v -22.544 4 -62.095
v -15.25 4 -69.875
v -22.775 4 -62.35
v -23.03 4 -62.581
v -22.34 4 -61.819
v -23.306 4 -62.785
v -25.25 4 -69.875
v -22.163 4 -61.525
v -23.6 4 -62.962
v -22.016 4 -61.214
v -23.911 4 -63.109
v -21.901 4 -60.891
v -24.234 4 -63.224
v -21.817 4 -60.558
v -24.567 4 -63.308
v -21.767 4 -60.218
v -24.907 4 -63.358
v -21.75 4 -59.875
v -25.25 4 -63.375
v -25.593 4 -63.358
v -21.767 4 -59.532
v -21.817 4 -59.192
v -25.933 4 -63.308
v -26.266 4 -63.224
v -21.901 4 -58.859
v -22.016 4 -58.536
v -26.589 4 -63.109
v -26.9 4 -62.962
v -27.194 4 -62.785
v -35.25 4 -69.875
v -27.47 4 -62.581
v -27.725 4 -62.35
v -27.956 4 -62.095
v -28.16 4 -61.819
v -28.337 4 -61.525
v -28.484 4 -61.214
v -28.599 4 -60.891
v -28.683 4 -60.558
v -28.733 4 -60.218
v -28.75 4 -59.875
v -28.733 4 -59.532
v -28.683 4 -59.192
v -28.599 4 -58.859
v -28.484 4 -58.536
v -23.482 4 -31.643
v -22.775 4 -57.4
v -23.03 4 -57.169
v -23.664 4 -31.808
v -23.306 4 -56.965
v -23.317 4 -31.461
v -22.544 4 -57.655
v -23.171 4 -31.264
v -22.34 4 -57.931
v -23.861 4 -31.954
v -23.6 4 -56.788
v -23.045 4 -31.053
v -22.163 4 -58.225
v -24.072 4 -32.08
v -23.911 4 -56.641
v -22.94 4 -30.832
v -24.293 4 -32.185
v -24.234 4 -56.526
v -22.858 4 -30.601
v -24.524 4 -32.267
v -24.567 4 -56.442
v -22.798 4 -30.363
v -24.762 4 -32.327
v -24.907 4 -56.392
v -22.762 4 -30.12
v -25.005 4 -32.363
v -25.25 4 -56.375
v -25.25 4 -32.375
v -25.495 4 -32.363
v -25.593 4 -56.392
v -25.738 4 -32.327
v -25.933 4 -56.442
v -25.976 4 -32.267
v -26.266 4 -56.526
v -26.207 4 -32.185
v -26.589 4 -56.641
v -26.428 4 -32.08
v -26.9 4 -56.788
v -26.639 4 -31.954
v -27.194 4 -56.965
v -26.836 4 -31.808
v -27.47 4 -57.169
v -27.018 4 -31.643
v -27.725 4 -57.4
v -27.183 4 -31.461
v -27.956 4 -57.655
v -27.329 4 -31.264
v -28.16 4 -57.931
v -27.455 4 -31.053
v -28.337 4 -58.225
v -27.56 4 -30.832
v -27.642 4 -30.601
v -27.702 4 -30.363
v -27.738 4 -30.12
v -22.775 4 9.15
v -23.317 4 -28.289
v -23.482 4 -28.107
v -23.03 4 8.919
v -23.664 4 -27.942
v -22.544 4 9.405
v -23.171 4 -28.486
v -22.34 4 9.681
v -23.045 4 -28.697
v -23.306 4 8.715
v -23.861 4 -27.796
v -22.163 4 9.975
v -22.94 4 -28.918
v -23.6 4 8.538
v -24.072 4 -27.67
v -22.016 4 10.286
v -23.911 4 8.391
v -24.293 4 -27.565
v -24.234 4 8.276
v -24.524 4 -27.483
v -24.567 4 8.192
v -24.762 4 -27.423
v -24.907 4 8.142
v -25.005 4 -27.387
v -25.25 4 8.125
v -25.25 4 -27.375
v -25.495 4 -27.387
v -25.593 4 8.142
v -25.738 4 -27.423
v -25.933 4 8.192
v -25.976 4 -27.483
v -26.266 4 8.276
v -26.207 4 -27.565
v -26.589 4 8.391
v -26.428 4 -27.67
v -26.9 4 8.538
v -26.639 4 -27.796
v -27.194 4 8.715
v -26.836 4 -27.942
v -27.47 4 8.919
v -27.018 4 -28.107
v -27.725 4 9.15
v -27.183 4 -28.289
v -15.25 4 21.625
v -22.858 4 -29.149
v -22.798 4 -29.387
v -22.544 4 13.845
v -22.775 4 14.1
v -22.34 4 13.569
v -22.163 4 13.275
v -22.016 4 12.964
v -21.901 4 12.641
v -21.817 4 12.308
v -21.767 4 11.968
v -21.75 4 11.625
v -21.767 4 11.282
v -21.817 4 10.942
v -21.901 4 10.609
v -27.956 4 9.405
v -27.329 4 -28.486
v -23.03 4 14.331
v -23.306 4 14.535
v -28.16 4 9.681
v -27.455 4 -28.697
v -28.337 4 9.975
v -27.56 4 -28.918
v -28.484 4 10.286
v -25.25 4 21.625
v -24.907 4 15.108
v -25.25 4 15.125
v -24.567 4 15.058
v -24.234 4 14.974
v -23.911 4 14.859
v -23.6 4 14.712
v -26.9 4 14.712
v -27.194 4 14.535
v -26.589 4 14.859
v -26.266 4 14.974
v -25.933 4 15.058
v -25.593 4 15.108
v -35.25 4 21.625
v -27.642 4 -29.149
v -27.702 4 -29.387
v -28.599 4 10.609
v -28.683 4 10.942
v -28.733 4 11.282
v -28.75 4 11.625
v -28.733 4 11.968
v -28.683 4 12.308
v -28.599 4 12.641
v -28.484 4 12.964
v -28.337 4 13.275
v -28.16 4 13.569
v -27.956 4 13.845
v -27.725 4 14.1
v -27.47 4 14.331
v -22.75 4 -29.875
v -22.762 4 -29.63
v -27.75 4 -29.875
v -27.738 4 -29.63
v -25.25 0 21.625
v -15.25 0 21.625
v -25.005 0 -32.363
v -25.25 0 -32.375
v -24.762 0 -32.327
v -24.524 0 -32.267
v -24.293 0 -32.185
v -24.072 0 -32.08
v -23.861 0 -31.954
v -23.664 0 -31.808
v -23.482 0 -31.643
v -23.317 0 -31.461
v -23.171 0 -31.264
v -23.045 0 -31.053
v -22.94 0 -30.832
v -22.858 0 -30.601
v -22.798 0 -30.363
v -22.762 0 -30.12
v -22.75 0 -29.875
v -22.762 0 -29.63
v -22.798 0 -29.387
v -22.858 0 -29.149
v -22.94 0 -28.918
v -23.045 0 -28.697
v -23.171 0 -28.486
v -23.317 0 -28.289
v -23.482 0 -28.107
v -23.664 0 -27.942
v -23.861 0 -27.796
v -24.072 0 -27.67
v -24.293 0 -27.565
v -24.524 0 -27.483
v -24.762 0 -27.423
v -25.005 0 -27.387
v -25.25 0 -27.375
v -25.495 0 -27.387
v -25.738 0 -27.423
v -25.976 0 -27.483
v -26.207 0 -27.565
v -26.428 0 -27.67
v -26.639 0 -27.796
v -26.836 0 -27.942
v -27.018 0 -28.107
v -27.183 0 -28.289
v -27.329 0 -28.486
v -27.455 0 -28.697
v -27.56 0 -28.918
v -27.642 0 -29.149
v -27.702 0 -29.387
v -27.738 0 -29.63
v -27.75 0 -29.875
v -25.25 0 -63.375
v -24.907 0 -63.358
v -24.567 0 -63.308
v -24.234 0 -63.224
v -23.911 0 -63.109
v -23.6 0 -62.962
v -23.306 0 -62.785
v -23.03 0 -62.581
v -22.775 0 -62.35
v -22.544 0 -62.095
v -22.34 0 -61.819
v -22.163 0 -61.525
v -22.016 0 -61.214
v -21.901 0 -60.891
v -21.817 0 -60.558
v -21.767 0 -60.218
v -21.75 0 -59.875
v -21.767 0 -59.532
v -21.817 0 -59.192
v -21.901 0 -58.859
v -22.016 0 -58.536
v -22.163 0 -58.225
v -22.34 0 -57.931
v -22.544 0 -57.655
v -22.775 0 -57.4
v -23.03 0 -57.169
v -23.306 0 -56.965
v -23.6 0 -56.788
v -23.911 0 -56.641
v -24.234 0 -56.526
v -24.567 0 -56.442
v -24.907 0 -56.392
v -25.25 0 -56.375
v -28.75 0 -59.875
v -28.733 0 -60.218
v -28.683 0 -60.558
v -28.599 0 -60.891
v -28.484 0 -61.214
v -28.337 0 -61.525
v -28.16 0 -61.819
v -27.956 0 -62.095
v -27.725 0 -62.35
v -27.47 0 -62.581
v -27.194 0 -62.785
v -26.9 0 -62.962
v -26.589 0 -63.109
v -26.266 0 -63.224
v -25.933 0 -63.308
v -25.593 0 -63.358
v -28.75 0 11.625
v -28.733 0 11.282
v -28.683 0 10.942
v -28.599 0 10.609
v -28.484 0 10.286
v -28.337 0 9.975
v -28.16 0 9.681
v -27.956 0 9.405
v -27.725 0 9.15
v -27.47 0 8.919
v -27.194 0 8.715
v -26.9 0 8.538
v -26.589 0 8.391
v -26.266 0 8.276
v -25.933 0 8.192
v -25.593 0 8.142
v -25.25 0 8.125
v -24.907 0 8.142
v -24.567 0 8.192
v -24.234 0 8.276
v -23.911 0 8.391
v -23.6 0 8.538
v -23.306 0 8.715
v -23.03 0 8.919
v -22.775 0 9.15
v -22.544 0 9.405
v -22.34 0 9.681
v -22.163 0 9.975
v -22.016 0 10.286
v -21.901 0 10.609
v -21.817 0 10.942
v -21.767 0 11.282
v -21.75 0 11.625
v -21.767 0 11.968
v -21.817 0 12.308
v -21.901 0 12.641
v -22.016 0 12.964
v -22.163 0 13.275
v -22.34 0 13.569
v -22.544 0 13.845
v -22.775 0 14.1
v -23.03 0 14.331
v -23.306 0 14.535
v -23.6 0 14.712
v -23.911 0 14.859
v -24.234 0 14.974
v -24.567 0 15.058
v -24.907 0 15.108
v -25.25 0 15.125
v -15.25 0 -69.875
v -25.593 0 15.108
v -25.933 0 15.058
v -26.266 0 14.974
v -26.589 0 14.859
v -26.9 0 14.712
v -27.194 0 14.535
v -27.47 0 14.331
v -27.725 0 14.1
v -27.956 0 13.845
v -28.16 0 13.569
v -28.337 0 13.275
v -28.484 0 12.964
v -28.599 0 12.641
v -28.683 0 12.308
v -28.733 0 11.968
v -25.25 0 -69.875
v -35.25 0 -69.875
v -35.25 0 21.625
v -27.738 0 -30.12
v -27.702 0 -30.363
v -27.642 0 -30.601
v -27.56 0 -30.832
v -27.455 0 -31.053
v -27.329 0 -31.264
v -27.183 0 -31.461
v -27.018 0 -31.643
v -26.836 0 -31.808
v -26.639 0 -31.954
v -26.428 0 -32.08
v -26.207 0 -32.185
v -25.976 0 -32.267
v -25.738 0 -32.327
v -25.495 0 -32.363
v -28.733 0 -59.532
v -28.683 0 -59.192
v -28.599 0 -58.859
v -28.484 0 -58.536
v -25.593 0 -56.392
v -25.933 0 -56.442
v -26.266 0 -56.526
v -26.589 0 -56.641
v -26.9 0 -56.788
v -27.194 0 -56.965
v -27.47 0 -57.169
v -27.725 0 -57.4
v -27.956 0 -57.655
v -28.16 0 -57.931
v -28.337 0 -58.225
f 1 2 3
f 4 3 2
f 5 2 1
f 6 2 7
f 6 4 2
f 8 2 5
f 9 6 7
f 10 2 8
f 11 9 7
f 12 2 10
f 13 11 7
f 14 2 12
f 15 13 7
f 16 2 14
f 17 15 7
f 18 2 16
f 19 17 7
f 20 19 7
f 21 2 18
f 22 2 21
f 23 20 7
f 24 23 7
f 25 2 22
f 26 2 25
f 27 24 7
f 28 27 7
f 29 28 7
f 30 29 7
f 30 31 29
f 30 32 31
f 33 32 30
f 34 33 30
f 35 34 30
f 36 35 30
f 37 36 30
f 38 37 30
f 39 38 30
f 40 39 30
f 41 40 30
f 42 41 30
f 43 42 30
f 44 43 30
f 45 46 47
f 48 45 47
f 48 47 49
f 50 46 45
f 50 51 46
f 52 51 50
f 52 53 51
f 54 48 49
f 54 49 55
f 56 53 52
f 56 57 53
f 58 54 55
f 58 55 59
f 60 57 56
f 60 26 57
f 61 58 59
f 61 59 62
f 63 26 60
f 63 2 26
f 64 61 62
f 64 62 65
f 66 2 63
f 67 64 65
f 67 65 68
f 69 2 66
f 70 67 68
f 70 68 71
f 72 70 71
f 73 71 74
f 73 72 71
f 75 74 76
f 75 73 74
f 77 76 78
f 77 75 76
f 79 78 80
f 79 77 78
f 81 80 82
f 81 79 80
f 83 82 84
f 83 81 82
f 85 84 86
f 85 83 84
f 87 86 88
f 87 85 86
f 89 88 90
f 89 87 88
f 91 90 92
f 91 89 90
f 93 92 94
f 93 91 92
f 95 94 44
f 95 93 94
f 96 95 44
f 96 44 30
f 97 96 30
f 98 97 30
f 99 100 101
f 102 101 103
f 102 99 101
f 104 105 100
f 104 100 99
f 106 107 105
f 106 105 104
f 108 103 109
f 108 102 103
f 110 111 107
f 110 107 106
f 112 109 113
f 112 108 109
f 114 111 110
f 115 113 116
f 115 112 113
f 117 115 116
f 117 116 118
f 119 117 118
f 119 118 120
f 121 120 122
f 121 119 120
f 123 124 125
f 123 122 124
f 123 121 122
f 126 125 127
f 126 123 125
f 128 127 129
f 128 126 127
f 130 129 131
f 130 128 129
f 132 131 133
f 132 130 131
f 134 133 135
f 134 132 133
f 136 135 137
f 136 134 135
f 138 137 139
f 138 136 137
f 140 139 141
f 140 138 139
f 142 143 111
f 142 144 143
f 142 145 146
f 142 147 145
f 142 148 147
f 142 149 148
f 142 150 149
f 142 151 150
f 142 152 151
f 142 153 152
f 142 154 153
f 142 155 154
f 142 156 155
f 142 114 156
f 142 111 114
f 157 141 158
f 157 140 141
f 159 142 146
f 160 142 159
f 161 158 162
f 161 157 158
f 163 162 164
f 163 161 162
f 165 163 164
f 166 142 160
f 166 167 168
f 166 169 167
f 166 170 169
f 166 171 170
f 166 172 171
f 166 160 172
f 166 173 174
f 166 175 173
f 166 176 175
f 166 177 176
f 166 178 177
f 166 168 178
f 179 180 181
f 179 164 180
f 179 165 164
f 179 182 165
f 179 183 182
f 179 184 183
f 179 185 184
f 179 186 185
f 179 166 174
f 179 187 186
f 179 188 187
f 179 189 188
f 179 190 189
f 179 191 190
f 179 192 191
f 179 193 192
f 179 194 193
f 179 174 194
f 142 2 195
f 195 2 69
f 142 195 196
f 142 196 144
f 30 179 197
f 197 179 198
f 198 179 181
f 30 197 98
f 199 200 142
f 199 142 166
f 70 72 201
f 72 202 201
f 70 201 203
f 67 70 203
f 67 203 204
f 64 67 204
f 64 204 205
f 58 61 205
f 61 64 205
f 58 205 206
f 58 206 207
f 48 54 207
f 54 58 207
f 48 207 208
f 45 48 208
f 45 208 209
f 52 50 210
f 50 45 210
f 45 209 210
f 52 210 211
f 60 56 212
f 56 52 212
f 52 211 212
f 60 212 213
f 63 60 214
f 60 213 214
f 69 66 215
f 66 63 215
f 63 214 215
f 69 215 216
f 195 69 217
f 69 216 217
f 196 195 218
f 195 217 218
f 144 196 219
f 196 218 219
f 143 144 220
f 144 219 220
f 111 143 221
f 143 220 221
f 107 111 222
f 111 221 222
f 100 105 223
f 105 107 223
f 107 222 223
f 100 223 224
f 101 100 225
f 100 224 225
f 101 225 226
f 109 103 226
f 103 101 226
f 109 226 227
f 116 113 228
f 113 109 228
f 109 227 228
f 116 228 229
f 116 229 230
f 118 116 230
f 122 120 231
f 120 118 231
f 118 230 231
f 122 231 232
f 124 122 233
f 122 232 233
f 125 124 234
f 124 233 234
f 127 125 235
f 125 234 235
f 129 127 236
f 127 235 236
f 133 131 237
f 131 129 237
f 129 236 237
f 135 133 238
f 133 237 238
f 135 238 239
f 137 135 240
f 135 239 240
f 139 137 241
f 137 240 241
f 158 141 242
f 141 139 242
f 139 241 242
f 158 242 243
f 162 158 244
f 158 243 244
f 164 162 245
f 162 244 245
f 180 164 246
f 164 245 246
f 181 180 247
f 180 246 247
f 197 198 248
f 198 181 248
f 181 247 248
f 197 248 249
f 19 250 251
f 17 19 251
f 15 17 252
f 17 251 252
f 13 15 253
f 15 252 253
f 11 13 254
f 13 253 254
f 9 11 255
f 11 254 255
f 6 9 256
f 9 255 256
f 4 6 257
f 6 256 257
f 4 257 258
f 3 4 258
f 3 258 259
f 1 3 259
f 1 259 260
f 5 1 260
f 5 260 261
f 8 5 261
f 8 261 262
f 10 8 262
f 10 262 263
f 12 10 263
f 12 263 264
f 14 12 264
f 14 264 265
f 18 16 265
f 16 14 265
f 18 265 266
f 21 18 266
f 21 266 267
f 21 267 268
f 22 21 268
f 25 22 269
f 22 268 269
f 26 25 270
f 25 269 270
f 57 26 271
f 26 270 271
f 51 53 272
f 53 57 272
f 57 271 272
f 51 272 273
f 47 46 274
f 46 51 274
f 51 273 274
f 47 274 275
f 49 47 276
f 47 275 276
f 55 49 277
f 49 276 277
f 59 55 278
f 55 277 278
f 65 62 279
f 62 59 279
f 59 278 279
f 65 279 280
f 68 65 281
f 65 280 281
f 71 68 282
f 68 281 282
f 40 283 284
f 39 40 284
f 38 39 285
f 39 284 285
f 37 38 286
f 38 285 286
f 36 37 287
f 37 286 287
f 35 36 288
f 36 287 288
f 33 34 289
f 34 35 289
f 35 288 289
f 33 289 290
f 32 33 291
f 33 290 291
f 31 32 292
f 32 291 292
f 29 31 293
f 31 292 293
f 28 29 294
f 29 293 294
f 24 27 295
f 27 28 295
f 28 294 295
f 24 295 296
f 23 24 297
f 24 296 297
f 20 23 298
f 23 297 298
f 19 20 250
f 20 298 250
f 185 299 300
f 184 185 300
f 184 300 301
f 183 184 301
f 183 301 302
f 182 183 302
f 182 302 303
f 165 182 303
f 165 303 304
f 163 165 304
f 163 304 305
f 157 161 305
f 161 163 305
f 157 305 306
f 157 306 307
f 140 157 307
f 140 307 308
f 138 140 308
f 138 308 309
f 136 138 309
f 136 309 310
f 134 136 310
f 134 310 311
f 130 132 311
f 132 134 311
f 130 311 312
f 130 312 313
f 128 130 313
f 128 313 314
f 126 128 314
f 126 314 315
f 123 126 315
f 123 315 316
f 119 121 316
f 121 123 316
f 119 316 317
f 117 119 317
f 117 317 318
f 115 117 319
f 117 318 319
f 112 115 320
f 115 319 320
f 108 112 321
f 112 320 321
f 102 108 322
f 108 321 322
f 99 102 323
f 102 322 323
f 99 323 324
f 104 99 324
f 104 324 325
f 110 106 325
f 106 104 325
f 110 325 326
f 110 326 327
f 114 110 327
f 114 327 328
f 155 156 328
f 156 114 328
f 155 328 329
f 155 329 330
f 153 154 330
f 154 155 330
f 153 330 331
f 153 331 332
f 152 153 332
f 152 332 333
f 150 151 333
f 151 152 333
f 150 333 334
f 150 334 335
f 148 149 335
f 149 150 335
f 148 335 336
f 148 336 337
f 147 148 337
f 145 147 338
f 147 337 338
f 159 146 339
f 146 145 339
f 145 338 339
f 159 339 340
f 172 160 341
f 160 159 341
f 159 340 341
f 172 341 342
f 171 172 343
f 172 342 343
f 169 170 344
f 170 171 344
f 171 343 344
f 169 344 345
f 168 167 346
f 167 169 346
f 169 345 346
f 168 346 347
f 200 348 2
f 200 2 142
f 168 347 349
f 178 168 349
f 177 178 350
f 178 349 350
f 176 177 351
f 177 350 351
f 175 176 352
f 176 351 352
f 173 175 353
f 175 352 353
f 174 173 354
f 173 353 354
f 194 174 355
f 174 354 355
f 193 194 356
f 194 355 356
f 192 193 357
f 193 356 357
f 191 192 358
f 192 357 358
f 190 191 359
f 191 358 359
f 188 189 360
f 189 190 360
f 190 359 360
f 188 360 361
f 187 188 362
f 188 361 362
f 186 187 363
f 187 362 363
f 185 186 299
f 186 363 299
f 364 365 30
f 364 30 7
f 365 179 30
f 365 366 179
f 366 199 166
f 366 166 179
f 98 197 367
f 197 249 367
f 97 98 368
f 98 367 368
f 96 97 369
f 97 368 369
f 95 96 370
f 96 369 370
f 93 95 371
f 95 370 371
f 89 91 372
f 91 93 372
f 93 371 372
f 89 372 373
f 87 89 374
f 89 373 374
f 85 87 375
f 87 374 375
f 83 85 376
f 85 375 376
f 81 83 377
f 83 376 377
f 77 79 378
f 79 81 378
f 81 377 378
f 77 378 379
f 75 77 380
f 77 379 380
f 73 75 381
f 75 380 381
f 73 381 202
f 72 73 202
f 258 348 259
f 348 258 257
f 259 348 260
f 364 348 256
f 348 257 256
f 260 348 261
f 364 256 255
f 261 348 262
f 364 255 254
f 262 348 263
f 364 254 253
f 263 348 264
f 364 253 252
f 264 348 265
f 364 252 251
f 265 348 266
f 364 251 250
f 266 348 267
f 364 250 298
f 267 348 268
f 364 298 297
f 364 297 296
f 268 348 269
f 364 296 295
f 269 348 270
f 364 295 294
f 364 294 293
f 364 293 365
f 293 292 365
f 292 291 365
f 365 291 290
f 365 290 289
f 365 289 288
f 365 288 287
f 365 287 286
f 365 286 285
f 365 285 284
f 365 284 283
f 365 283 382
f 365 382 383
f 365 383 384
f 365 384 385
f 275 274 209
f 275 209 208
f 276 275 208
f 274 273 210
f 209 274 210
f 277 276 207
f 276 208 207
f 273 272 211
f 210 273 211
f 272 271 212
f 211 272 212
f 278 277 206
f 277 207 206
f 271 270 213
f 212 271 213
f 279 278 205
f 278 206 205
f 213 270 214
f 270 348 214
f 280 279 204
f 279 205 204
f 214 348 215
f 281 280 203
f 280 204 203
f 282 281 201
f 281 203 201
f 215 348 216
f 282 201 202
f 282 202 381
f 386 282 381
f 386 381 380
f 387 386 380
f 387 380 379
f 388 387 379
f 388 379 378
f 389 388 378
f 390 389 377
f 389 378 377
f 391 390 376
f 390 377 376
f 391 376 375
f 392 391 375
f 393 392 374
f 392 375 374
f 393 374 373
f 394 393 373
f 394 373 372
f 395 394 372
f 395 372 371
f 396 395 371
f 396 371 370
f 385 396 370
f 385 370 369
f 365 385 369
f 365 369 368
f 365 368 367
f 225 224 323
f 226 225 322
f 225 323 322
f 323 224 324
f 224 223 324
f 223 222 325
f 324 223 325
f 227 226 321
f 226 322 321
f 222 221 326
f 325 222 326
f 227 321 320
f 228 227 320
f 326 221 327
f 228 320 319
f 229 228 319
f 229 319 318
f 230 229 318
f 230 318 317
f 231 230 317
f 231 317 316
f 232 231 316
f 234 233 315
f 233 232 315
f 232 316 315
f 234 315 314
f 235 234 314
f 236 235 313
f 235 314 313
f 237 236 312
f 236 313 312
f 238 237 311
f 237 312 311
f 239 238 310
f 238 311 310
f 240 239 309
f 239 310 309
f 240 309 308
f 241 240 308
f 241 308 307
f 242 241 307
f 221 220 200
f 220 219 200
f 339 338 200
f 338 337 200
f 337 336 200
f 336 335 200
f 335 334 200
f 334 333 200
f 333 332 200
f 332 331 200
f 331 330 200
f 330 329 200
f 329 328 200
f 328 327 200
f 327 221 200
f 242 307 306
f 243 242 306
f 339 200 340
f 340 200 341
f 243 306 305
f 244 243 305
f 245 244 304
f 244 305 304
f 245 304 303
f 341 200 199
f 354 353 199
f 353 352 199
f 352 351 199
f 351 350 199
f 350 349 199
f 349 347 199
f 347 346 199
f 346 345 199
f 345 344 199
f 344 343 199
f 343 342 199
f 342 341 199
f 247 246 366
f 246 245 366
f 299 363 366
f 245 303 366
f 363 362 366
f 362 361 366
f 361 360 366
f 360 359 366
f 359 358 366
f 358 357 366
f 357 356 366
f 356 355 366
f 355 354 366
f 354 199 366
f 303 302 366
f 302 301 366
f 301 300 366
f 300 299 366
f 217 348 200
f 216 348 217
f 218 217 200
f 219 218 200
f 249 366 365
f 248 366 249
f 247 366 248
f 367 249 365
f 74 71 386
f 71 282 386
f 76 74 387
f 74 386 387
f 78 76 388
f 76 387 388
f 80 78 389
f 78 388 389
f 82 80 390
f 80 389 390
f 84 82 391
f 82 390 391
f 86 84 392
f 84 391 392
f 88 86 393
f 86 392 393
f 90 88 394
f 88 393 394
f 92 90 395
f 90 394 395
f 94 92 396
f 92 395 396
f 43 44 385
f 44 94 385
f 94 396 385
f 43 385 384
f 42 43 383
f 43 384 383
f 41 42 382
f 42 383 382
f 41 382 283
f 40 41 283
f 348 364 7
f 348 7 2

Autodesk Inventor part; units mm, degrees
ref_plane "YZ Plane" through (0, 0, 0) normal (1, 0, 0) x (0, 1, 0)
ref_plane "XZ Plane" through (0, 0, 0) normal (0, 1, 0) x (-1, 0, 0)
ref_plane "XY Plane" through (0, 0, 0) normal (0, 0, 1) x (1, 0, 0)
sketch "Sketch1" plane through (0, 0, 0) normal (0, 1, 0) x (-1, 0, 0)
  circle A0 centre (0, 0) radius 10.5
  line L0 (0, 0) -> (0, -23.5)
  circle A1 centre (0, -23.5) radius 5.25
  line L1 (0, -23.5) -> (0, -35.25)
  line L2 (-14, -35.25) -> (-14, -58.75)
  line L3 (-14, -58.75) -> (-19, -58.75)
  line L4 (-19, -58.75) -> (-19, -35.25)
  line L5 (-35.25, 21.625) -> (35.25, 21.625)
  line L6 (-35.25, 21.625) -> (35.25, 21.625) construction
  line L7 (35.25, 21.625) -> (25.25, 21.625)
  line L8 (-35.25, 21.625) -> (35.25, 21.625)
  line L9 (35.25, 21.625) -> (35.25, -69.875)
  line L10 (35.25, -69.875) -> (-35.25, -69.875)
  line L11 (-35.25, 11.625) -> (-35.25, 21.625)
  line L12 (-35.25, 21.625) -> (-35.25, 11.625)
  line L13 (-35.25, 11.625) -> (-25.25, 11.625)
  circle A2 centre (-25.25, 11.625) radius 3.5
  line L14 (35.25, 21.625) -> (25.25, 21.625)
  line L15 (25.25, 21.625) -> (25.25, 11.625)
  circle A3 centre (25.25, 11.625) radius 3.5
  line L16 (35.25, -69.875) -> (25.25, -69.875)
  line L17 (25.25, -69.875) -> (25.25, -59.875)
  circle A4 centre (25.25, -59.875) radius 3.5
  line L18 (-35.25, -69.875) -> (-25.25, -69.875)
  line L19 (-25.25, -69.875) -> (-25.25, -59.875)
  circle A5 centre (-25.25, -59.875) radius 3.5
  line L20 (-25.25, 11.625) -> (-25.25, -18.375)
  line L21 (25.25, -59.875) -> (25.25, -29.875)
  circle A6 centre (-25.25, -18.375) radius 2.5
  circle A7 centre (25.25, -29.875) radius 2.5
  line L22 (-19, -35.25) -> (-14, -35.25)
  line L23 (35.25, -69.875) -> (15.25, -69.875)
  line L24 (15.25, -69.875) -> (15.25, 21.625)
  dimension "d0" = 21
  dimension "d1" = 23.5
  dimension "d2" = 10.5
  dimension "d3" = 11.75
  dimension "d5" = 23.5
  dimension "d6" = 5
  dimension "d7" = 23.5
  dimension "d9" = 70.5
  dimension "d40" = 21.625
  dimension "d41" = 70.5
  dimension "d42" = 91.5
  dimension "d43" = 10
  dimension "d44" = 10
  dimension "d45" = 7
  dimension "d46" = 10
  dimension "d47" = 10
  dimension "d48" = 90
  dimension "d50" = 7
  dimension "d51" = 10
  dimension "d52" = 10
  dimension "d53" = 7
  dimension "d54" = 10
  dimension "d55" = 10
  dimension "d56" = 7
  dimension "d60" = 30
  dimension "d61" = 30
  dimension "d62" = 5
  dimension "d63" = 5
  dimension "d64" = 14
  dimension "d65" = 20
extrude "Extrusion1" add sketch "Sketch1" along normal blind 4 contours L5 L9 L10 L24
properties part number "m"
